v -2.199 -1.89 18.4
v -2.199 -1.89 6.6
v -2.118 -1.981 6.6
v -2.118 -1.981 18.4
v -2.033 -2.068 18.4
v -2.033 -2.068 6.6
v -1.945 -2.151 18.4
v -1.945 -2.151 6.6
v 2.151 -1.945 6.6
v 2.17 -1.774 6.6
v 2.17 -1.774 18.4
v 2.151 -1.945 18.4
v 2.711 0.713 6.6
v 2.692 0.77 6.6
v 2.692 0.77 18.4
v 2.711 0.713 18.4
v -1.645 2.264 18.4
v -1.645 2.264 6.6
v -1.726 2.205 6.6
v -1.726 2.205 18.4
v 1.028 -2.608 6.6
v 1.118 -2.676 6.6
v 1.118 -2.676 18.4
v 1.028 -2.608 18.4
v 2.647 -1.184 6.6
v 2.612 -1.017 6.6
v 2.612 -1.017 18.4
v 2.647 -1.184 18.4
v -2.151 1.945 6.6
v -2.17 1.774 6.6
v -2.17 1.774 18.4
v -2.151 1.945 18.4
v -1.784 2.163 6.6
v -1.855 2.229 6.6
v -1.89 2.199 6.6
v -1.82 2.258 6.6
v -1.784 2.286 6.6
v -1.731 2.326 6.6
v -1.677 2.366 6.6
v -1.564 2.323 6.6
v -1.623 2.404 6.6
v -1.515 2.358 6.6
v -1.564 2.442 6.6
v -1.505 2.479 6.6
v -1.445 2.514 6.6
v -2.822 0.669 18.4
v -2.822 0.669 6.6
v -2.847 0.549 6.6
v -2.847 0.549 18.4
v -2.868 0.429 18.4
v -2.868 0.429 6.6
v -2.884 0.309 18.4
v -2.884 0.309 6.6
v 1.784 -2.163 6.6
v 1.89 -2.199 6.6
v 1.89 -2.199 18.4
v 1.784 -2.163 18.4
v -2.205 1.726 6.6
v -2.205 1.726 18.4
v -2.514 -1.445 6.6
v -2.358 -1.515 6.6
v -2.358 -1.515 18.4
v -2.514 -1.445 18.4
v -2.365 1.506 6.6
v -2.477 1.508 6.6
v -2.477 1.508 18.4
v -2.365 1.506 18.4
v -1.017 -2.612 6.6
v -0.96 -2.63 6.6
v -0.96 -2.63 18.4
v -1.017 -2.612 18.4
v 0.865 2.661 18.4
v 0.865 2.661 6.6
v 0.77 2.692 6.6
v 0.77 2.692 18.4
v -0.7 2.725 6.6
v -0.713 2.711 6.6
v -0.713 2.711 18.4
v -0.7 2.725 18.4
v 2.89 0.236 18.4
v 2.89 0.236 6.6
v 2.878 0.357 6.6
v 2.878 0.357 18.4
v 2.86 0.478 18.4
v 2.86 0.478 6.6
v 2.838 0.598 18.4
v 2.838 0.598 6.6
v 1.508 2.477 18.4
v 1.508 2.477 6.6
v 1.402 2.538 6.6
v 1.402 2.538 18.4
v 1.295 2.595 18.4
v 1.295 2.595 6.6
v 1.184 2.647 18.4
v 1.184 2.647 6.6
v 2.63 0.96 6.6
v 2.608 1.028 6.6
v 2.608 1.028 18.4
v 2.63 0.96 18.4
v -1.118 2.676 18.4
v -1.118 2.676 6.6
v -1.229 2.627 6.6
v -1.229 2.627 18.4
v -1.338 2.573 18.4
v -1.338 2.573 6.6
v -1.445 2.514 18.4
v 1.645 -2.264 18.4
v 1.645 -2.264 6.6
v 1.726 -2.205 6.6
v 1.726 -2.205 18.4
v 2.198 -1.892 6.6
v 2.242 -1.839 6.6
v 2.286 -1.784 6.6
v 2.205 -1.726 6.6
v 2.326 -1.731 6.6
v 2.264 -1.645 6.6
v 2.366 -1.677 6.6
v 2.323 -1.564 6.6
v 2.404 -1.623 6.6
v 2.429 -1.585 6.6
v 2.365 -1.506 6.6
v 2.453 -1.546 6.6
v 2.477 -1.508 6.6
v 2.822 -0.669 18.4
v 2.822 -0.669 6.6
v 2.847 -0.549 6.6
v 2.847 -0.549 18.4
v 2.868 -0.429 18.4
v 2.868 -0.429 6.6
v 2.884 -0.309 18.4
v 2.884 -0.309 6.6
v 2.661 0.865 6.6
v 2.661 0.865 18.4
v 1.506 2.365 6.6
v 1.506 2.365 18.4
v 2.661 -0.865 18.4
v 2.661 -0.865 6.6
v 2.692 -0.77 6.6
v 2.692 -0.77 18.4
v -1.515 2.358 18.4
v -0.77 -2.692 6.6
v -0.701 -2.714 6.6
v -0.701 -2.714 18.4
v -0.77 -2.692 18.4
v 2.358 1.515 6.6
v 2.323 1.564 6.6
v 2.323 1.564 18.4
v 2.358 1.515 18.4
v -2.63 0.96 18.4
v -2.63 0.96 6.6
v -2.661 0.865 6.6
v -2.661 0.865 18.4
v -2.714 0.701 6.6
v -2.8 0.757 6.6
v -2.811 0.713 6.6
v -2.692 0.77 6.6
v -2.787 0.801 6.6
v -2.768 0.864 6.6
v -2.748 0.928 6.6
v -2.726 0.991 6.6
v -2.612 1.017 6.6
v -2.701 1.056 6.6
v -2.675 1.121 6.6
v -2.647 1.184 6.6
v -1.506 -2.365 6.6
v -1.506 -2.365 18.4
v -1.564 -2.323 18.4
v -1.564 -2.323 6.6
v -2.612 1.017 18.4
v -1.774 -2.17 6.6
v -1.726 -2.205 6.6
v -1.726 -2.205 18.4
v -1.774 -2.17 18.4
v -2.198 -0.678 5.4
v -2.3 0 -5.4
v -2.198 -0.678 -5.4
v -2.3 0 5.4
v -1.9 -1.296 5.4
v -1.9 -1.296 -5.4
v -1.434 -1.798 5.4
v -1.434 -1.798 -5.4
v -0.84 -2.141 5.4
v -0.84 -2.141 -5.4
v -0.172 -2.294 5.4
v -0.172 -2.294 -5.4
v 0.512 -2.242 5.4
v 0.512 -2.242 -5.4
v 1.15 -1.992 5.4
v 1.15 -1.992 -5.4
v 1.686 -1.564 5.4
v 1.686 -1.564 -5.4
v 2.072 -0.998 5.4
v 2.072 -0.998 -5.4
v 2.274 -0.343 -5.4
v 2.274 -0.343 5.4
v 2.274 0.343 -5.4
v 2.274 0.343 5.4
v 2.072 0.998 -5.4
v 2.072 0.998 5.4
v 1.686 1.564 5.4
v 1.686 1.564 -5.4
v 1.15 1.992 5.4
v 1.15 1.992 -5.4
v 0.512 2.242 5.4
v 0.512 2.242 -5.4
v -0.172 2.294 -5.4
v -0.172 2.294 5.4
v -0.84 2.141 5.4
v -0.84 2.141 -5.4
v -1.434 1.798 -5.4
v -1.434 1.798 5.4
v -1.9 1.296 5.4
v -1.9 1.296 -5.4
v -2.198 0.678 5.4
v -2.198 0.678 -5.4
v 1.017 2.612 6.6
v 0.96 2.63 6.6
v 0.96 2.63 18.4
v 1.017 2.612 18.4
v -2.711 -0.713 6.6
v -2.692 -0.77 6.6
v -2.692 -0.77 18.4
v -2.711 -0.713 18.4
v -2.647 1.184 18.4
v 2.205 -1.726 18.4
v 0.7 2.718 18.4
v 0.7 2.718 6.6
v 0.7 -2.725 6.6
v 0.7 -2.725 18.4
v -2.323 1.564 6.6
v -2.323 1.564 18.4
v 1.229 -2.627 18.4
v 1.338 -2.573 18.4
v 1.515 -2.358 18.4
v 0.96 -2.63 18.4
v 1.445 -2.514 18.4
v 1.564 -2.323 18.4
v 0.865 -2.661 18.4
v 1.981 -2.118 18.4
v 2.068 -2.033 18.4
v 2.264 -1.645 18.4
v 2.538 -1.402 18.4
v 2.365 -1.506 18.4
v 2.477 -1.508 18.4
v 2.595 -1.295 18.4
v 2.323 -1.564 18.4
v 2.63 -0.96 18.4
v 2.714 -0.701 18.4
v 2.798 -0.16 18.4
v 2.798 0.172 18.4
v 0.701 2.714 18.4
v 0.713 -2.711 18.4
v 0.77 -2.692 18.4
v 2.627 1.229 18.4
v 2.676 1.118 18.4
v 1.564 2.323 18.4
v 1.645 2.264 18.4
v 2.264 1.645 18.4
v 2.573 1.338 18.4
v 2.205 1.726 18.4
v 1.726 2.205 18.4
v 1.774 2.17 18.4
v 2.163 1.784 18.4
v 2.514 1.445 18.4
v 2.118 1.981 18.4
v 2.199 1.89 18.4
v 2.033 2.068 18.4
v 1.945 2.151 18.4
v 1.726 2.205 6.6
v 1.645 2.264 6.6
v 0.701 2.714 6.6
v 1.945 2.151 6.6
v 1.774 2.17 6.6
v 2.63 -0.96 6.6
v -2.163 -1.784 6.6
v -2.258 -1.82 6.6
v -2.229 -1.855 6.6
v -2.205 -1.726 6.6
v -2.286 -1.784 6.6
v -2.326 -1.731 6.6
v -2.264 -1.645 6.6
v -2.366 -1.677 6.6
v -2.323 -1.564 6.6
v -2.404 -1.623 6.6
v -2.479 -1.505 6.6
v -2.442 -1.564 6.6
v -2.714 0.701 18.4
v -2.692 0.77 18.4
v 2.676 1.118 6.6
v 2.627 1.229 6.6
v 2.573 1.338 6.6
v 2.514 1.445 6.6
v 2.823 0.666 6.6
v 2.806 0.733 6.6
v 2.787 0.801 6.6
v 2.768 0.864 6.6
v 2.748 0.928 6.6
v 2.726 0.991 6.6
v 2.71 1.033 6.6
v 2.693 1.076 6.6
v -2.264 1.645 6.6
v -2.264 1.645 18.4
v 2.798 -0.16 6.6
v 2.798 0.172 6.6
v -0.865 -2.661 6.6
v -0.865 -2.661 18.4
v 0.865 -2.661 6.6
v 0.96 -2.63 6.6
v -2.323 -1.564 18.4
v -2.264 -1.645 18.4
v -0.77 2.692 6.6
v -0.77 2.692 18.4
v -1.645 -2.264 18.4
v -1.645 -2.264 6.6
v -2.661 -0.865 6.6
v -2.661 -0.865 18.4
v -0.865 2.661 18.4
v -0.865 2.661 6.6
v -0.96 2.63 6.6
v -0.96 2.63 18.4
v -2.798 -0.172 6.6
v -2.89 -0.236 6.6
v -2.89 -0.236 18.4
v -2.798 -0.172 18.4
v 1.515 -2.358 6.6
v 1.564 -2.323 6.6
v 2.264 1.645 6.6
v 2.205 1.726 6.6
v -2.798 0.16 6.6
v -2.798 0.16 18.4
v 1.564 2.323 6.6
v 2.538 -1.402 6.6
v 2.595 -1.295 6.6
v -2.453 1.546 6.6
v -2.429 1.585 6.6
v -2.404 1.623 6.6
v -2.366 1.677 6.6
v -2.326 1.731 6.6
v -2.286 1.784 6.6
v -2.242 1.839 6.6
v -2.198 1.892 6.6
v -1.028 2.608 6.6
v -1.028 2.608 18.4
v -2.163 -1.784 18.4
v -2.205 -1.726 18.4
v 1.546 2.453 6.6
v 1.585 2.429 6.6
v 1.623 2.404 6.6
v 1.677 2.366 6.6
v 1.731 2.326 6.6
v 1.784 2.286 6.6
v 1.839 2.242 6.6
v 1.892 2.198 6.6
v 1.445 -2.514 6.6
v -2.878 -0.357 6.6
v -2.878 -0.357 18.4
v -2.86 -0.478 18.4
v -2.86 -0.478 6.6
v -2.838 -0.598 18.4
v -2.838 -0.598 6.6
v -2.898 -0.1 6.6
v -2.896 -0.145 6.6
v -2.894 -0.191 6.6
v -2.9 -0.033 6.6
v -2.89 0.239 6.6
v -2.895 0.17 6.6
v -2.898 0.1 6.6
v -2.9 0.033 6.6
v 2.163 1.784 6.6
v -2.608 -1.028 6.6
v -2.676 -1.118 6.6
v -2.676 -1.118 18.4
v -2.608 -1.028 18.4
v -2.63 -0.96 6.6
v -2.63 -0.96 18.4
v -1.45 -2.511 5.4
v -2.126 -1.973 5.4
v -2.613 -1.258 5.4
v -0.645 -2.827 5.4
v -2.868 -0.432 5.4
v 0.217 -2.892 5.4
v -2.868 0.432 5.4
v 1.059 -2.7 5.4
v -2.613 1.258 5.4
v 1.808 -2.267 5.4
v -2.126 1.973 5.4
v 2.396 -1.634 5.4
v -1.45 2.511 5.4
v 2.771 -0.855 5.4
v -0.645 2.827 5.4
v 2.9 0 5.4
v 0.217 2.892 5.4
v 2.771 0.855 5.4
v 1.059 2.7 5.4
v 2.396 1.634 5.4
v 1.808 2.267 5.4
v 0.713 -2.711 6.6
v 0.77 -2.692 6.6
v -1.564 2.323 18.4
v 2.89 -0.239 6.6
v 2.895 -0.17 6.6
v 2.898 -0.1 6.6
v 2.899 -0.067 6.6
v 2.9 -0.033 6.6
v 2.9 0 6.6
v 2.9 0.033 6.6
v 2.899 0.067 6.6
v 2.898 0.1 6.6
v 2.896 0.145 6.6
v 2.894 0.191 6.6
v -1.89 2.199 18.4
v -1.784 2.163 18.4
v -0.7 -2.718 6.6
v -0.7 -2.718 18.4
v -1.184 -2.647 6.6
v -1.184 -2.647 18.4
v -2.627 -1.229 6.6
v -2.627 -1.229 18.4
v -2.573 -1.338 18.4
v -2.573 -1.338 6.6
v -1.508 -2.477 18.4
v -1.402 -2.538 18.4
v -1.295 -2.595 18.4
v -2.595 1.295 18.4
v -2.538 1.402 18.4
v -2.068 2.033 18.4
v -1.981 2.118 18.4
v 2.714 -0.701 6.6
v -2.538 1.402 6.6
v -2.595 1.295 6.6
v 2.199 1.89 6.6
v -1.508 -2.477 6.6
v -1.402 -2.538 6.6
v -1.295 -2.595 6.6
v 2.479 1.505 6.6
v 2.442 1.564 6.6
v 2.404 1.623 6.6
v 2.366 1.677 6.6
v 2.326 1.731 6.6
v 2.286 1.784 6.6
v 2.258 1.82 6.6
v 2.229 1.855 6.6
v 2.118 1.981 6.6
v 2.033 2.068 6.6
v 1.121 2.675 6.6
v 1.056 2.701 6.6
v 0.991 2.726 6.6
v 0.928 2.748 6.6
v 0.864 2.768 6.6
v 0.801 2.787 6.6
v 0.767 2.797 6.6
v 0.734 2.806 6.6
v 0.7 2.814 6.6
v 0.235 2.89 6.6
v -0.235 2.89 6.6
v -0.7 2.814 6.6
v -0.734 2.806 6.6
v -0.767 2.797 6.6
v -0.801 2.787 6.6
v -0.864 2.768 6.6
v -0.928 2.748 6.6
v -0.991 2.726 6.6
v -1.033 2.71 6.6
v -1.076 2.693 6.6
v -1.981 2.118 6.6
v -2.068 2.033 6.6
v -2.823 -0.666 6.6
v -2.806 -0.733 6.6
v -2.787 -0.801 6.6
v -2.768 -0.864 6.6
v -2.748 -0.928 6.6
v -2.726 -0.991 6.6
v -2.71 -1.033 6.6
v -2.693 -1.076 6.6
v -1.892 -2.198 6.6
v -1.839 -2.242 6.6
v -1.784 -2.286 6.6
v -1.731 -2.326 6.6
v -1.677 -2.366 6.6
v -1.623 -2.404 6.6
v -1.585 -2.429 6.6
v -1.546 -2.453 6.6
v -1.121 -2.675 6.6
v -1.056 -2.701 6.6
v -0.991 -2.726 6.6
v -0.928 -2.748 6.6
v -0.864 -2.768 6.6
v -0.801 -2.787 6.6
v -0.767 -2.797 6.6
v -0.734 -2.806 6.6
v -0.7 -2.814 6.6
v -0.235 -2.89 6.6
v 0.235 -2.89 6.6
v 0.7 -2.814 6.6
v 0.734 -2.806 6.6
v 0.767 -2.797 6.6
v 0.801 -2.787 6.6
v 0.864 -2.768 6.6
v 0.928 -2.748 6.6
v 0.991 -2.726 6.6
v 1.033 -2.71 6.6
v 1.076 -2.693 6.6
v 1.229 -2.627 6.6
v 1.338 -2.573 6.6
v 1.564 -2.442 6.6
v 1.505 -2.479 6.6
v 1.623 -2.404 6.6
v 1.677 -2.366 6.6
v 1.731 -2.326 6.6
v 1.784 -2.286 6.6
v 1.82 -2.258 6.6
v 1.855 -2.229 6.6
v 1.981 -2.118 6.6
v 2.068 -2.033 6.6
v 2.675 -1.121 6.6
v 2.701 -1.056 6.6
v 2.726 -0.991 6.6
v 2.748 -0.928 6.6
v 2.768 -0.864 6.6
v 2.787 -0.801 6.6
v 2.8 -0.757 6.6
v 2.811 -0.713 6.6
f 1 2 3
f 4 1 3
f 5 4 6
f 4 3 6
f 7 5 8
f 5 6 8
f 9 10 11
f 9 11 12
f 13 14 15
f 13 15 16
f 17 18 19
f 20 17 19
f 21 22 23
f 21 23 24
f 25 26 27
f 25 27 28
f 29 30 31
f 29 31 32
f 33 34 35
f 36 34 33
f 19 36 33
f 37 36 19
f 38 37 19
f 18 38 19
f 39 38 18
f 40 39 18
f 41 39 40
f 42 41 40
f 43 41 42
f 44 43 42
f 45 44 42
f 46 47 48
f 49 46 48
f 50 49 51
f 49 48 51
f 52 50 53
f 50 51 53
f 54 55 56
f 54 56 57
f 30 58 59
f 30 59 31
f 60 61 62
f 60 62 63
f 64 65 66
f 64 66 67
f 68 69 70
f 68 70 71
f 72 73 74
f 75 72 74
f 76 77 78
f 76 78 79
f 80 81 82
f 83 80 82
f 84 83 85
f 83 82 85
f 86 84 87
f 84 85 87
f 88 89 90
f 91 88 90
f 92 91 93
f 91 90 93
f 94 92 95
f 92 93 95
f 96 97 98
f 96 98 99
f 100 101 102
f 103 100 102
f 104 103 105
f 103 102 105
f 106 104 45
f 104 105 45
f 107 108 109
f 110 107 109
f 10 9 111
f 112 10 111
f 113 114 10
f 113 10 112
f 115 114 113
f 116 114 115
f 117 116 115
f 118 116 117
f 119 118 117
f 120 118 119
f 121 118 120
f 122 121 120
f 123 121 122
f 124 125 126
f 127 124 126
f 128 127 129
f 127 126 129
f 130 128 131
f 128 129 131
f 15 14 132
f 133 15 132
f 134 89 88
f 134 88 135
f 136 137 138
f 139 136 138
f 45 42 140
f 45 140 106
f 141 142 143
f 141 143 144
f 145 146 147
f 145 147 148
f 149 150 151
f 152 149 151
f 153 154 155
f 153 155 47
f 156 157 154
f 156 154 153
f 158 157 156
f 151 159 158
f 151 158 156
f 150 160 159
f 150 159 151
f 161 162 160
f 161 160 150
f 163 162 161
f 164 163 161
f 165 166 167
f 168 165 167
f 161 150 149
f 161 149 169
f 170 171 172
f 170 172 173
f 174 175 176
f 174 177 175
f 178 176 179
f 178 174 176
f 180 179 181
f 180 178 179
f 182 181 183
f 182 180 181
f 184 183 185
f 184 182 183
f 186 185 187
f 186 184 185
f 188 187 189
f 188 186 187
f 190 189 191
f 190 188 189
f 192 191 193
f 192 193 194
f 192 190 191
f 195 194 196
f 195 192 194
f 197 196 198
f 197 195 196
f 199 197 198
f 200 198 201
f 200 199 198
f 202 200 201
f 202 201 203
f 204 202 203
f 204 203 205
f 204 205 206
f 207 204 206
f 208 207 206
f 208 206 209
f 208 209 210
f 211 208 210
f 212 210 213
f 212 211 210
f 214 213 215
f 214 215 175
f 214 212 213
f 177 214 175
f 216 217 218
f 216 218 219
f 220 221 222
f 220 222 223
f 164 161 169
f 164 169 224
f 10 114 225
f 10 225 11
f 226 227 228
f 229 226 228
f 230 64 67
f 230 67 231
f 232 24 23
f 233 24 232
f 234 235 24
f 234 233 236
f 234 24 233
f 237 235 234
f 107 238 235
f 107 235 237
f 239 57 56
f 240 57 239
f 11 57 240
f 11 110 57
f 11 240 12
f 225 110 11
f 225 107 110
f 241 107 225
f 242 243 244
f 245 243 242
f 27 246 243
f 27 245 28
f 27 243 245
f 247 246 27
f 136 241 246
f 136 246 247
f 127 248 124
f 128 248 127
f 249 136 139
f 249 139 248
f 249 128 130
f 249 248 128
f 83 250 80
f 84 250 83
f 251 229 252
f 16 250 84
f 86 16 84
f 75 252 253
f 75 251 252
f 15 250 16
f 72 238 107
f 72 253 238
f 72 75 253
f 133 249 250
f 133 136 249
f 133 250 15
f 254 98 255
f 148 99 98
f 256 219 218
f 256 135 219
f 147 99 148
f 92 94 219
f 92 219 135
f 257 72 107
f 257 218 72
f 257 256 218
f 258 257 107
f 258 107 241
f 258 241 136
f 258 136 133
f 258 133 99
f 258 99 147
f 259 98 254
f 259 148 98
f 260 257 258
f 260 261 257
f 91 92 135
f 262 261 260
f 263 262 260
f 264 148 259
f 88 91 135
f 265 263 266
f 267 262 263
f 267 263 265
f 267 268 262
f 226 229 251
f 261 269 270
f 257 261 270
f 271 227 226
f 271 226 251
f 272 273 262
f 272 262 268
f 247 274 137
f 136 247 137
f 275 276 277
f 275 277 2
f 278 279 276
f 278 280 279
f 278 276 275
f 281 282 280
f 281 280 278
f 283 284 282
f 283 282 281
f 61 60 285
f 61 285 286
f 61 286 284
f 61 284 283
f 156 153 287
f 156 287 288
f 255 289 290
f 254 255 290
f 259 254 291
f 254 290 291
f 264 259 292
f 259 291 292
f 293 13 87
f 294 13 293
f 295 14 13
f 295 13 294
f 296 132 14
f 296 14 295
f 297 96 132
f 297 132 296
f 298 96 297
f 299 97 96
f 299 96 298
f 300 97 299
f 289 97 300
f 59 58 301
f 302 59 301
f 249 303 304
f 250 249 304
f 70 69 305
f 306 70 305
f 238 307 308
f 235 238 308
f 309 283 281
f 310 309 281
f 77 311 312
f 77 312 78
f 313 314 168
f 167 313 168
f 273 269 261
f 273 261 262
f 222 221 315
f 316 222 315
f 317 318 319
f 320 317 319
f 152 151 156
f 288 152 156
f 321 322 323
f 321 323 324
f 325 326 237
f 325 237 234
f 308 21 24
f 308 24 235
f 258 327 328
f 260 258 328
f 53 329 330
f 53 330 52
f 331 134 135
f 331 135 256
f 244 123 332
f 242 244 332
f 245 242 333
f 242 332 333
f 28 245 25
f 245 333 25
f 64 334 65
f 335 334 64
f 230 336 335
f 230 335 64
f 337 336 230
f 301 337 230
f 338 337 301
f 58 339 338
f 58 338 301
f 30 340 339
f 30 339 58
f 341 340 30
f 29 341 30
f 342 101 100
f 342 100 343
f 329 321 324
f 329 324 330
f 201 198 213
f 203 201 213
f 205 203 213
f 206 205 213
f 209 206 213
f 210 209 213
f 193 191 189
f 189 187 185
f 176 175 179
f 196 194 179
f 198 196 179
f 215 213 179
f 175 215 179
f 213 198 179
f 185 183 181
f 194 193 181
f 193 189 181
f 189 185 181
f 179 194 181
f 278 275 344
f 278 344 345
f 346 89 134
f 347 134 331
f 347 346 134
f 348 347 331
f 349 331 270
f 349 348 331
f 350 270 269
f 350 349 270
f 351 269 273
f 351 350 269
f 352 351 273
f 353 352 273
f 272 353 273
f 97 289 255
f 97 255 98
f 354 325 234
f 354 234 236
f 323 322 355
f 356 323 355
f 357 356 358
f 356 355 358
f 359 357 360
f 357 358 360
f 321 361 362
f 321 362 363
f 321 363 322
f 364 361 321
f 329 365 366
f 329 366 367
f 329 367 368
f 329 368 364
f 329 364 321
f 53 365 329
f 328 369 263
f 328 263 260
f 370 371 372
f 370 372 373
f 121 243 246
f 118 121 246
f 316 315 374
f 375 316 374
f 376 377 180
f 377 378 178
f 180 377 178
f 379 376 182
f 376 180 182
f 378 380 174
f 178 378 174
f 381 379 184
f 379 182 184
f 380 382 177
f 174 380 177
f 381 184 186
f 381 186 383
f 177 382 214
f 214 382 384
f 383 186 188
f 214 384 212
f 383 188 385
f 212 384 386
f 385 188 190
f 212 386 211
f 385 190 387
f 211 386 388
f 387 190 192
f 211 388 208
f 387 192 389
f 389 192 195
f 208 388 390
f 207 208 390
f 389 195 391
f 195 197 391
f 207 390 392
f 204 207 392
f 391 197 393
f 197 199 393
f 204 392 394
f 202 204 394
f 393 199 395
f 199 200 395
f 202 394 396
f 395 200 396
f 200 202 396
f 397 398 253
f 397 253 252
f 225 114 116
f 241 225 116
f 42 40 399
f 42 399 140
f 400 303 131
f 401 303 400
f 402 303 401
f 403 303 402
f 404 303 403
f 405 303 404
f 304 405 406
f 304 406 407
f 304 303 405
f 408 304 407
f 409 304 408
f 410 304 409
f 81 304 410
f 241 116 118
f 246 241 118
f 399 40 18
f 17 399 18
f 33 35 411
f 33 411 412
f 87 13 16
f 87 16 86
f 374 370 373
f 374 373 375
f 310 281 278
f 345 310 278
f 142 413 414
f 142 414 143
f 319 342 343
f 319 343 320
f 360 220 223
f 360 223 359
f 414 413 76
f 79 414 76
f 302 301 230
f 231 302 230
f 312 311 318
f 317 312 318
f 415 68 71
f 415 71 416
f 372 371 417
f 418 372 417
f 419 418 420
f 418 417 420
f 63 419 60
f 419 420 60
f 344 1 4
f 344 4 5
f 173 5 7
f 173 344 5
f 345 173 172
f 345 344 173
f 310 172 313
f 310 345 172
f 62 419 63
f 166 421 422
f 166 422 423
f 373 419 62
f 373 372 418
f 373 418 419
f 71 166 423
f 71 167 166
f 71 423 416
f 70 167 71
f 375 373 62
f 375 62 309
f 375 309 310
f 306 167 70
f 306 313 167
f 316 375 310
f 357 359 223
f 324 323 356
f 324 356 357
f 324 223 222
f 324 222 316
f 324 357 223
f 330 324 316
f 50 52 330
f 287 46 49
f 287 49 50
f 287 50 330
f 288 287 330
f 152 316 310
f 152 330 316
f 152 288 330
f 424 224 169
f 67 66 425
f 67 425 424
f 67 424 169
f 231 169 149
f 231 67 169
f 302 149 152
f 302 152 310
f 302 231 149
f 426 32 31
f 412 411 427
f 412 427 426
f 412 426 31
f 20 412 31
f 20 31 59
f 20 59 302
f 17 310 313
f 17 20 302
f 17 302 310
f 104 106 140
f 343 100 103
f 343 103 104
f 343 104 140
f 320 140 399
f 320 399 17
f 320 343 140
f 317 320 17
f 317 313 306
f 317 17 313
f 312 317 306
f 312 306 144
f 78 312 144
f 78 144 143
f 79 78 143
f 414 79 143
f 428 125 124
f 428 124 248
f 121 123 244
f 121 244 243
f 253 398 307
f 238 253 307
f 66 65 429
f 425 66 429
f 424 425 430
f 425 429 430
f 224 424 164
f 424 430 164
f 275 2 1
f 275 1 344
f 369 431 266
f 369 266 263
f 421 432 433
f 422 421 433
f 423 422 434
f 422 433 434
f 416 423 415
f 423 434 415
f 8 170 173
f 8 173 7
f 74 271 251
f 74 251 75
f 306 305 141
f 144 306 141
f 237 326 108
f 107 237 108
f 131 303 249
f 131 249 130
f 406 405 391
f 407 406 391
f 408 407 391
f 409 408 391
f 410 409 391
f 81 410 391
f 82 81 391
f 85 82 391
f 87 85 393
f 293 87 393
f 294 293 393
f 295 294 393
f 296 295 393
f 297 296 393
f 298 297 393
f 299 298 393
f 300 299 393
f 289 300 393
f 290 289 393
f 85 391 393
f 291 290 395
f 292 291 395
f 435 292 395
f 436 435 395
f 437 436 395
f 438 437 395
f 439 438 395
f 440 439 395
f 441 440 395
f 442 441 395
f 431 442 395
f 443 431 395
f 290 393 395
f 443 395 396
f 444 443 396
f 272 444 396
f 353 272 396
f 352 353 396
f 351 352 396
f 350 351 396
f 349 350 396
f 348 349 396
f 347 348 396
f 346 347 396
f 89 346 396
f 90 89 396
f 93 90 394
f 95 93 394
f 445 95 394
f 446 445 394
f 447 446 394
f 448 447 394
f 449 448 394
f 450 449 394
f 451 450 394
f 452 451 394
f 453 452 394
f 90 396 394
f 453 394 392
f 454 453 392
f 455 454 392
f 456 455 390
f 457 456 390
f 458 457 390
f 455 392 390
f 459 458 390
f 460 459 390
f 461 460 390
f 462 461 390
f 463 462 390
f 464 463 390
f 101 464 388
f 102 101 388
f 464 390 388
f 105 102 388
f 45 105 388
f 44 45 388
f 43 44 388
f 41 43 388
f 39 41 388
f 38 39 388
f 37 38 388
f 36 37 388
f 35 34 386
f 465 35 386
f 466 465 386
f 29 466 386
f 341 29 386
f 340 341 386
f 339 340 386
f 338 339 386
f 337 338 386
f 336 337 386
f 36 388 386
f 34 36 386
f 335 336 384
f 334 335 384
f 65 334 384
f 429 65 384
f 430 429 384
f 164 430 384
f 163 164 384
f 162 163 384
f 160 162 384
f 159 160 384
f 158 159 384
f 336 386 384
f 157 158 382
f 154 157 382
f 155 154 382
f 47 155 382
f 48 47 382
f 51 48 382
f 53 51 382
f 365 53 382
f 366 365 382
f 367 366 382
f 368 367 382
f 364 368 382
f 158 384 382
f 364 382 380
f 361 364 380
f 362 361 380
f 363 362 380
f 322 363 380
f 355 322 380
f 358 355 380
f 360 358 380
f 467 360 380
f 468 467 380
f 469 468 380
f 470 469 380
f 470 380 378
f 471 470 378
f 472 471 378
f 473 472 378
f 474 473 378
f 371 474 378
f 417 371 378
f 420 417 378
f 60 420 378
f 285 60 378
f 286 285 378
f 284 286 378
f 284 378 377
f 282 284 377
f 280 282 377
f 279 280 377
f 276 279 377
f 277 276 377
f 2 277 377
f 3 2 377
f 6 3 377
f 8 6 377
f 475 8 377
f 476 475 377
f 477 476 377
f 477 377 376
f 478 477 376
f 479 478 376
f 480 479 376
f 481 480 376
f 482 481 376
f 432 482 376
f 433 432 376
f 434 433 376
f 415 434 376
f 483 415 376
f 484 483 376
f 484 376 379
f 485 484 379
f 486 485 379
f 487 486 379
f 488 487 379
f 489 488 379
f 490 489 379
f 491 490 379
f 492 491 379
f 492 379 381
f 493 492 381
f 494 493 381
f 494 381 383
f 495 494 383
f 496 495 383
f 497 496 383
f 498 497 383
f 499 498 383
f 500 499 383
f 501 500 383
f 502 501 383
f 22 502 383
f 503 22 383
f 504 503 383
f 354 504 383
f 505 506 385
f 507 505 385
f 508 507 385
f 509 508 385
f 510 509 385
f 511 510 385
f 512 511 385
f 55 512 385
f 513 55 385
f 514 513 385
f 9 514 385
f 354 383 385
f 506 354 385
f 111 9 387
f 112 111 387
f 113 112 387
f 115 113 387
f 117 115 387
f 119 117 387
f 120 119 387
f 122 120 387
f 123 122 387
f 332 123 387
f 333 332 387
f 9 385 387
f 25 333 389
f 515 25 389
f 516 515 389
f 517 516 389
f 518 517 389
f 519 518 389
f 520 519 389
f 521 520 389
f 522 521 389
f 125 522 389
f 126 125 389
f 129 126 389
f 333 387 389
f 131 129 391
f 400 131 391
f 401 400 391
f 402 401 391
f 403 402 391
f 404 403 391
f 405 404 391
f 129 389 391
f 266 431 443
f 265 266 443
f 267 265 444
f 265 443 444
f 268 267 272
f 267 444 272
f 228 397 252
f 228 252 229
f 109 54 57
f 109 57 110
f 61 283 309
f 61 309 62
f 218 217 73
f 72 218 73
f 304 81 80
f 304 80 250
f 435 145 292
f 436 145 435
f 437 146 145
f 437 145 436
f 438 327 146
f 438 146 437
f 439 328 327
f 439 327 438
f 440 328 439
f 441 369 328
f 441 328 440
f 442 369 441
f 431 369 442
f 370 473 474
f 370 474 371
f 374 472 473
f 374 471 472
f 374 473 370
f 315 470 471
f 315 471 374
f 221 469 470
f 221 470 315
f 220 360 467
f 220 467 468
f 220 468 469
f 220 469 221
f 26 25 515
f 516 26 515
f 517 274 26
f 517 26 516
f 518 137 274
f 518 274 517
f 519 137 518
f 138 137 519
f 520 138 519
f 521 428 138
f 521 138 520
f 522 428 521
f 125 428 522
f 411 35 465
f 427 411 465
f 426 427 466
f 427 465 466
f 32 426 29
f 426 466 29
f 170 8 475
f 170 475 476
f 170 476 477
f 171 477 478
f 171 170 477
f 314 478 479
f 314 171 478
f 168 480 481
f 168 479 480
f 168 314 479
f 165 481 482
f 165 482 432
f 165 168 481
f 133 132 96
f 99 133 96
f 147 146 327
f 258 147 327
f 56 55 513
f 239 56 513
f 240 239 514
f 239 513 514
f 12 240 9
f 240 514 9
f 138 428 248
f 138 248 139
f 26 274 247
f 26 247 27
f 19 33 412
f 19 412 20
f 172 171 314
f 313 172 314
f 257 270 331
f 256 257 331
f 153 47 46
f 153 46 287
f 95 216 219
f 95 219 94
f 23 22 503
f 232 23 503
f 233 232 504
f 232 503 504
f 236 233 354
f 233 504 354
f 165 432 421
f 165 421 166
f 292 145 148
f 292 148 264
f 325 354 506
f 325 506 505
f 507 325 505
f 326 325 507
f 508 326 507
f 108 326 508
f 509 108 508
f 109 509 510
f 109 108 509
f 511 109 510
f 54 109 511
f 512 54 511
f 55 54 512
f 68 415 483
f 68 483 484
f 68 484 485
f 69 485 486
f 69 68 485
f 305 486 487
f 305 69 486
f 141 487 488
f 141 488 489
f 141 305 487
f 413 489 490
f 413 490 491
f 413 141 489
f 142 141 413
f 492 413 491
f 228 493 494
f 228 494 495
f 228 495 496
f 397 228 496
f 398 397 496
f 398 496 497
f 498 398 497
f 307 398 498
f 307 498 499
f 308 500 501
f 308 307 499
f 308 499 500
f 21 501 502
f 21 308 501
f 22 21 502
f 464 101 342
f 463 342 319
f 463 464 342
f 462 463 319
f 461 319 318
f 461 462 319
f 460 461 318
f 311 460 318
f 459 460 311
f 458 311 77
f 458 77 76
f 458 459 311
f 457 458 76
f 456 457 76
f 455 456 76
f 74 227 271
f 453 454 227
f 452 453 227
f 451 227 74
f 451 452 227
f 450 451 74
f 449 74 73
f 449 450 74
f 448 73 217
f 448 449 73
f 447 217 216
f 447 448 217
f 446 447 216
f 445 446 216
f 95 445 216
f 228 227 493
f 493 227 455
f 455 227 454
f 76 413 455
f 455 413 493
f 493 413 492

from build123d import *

# Parameters (mm, degrees)
SKETCH1_R           = 2.3
BOSS_EXTRUDE1_DEPTH = 5.4
BOSS_EXTRUDE2_START = 5.4
SKETCH2_R           = 2.9
BOSS_EXTRUDE2_DEPTH = 1.2
BOSS_EXTRUDE3_START = 6.6
BOSS_EXTRUDE3_DEPTH = 11.8
CHAMFER1_START      = 6.6
CHAMFER1_DEPTH      = 11.8


with BuildPart() as part:
    # Sketch1 → Boss-Extrude1 (new, symmetric)
    with BuildSketch(Plane.XY):
        with Locations(Location((0, 0, 0), (0, 0, 180))):
            Circle(SKETCH1_R)
    extrude(amount=BOSS_EXTRUDE1_DEPTH, both=True)

    # Sketch2 → Boss-Extrude2 (add)
    with BuildSketch(Plane.XY.offset(BOSS_EXTRUDE2_START)):
        Circle(SKETCH2_R)
    extrude(amount=BOSS_EXTRUDE2_DEPTH)

    # Sketch3 → Boss-Extrude3 (add)
    with BuildSketch(Plane.XY.offset(BOSS_EXTRUDE3_START)):
        with BuildLine():
            ThreePointArc((0.800510686, 2.787325356), (0.75037611, 2.801238243), (0.7, 2.814249456))
            Line((0.7, 2.814249456), (0.7, -2.814249456))
            ThreePointArc((0.7, -2.814249456), (0.75037611, -2.801238243), (0.800510686, -2.787325356))
            Line((0.800510686, -2.787325356), (0.769608986, -2.692219705))
            Line((0.769608986, -2.692219705), (0.864714638, -2.661318005))
            Line((0.864714638, -2.661318005), (0.959820289, -2.630416306))
            Line((0.959820289, -2.630416306), (0.990721989, -2.725521957))
            ThreePointArc((0.990721989, -2.725521957), (1.316572449, -2.58391892), (1.622661808, -2.403532537))
            Line((1.622661808, -2.403532537), (1.563883283, -2.322630838))
            Line((1.563883283, -2.322630838), (1.644784982, -2.263852312))
            Line((1.644784982, -2.263852312), (1.725686682, -2.205073787))
            Line((1.725686682, -2.205073787), (1.784465207, -2.285975487))
            ThreePointArc((1.784465207, -2.285975487), (2.050609665, -2.050609665), (2.285975487, -1.784465207))
            Line((2.285975487, -1.784465207), (2.205073787, -1.725686682))
            Line((2.205073787, -1.725686682), (2.263852312, -1.644784982))
            Line((2.263852312, -1.644784982), (2.322630838, -1.563883283))
            Line((2.322630838, -1.563883283), (2.403532537, -1.622661808))
            ThreePointArc((2.403532537, -1.622661808), (2.58391892, -1.316572449), (2.725521957, -0.990721989))
            Line((2.725521957, -0.990721989), (2.630416306, -0.959820289))
            Line((2.630416306, -0.959820289), (2.661318005, -0.864714638))
            Line((2.661318005, -0.864714638), (2.692219705, -0.769608986))
            Line((2.692219705, -0.769608986), (2.787325356, -0.800510686))
            ThreePointArc((2.787325356, -0.800510686), (2.864296188, -0.453659949), (2.898275349, -0.1))
            Line((2.898275349, -0.1), (2.798275349, -0.1))
            Line((2.798275349, -0.1), (2.798275349, 0))
            Line((2.798275349, 0), (2.798275349, 0.1))
            Line((2.798275349, 0.1), (2.898275349, 0.1))
            ThreePointArc((2.898275349, 0.1), (2.864296188, 0.453659949), (2.787325356, 0.800510686))
            Line((2.787325356, 0.800510686), (2.692219705, 0.769608986))
            Line((2.692219705, 0.769608986), (2.661318005, 0.864714638))
            Line((2.661318005, 0.864714638), (2.630416306, 0.959820289))
            Line((2.630416306, 0.959820289), (2.725521957, 0.990721989))
            ThreePointArc((2.725521957, 0.990721989), (2.58391892, 1.316572449), (2.403532537, 1.622661808))
            Line((2.403532537, 1.622661808), (2.322630838, 1.563883283))
            Line((2.322630838, 1.563883283), (2.263852312, 1.644784982))
            Line((2.263852312, 1.644784982), (2.205073787, 1.725686682))
            Line((2.205073787, 1.725686682), (2.285975487, 1.784465207))
            ThreePointArc((2.285975487, 1.784465207), (2.050609665, 2.050609665), (1.784465207, 2.285975487))
            Line((1.784465207, 2.285975487), (1.725686682, 2.205073787))
            Line((1.725686682, 2.205073787), (1.644784982, 2.263852312))
            Line((1.644784982, 2.263852312), (1.563883283, 2.322630838))
            Line((1.563883283, 2.322630838), (1.622661808, 2.403532537))
            ThreePointArc((1.622661808, 2.403532537), (1.316572449, 2.58391892), (0.990721989, 2.725521957))
            Line((0.990721989, 2.725521957), (0.959820289, 2.630416306))
            Line((0.959820289, 2.630416306), (0.864714638, 2.661318005))
            Line((0.864714638, 2.661318005), (0.769608986, 2.692219705))
            Line((0.769608986, 2.692219705), (0.800510686, 2.787325356))
        make_face()
        with BuildLine():
            Line((-2.798275349, 0), (-0.7, 0))
            Line((-0.7, 0), (-0.7, 2.814249456))
            ThreePointArc((-0.7, 2.814249456), (-0.75037611, 2.801238243), (-0.800510686, 2.787325356))
            Line((-0.800510686, 2.787325356), (-0.769608986, 2.692219705))
            Line((-0.769608986, 2.692219705), (-0.864714638, 2.661318005))
            Line((-0.864714638, 2.661318005), (-0.959820289, 2.630416306))
            Line((-0.959820289, 2.630416306), (-0.990721989, 2.725521957))
            ThreePointArc((-0.990721989, 2.725521957), (-1.316572449, 2.58391892), (-1.622661808, 2.403532537))
            Line((-1.622661808, 2.403532537), (-1.563883283, 2.322630838))
            Line((-1.563883283, 2.322630838), (-1.644784982, 2.263852312))
            Line((-1.644784982, 2.263852312), (-1.725686682, 2.205073787))
            Line((-1.725686682, 2.205073787), (-1.784465207, 2.285975487))
            ThreePointArc((-1.784465207, 2.285975487), (-2.050609665, 2.050609665), (-2.285975487, 1.784465207))
            Line((-2.285975487, 1.784465207), (-2.205073787, 1.725686682))
            Line((-2.205073787, 1.725686682), (-2.263852312, 1.644784982))
            Line((-2.263852312, 1.644784982), (-2.322630838, 1.563883283))
            Line((-2.322630838, 1.563883283), (-2.403532537, 1.622661808))
            ThreePointArc((-2.403532537, 1.622661808), (-2.58391892, 1.316572449), (-2.725521957, 0.990721989))
            Line((-2.725521957, 0.990721989), (-2.630416306, 0.959820289))
            Line((-2.630416306, 0.959820289), (-2.661318005, 0.864714638))
            Line((-2.661318005, 0.864714638), (-2.692219705, 0.769608986))
            Line((-2.692219705, 0.769608986), (-2.787325356, 0.800510686))
            ThreePointArc((-2.787325356, 0.800510686), (-2.864296188, 0.453659949), (-2.898275349, 0.1))
            Line((-2.898275349, 0.1), (-2.798275349, 0.1))
            Line((-2.798275349, 0.1), (-2.798275349, 0))
        make_face()
        with BuildLine():
            Line((-0.7, -2.814249456), (-0.7, 0))
            Line((-0.7, 0), (-2.798275349, 0))
            Line((-2.798275349, 0), (-2.798275349, -0.1))
            Line((-2.798275349, -0.1), (-2.898275349, -0.1))
            ThreePointArc((-2.898275349, -0.1), (-2.864296188, -0.453659949), (-2.787325356, -0.800510686))
            Line((-2.787325356, -0.800510686), (-2.692219705, -0.769608986))
            Line((-2.692219705, -0.769608986), (-2.661318005, -0.864714638))
            Line((-2.661318005, -0.864714638), (-2.630416306, -0.959820289))
            Line((-2.630416306, -0.959820289), (-2.725521957, -0.990721989))
            ThreePointArc((-2.725521957, -0.990721989), (-2.58391892, -1.316572449), (-2.403532537, -1.622661808))
            Line((-2.403532537, -1.622661808), (-2.322630838, -1.563883283))
            Line((-2.322630838, -1.563883283), (-2.263852312, -1.644784982))
            Line((-2.263852312, -1.644784982), (-2.205073787, -1.725686682))
            Line((-2.205073787, -1.725686682), (-2.285975487, -1.784465207))
            ThreePointArc((-2.285975487, -1.784465207), (-2.050609665, -2.050609665), (-1.784465207, -2.285975487))
            Line((-1.784465207, -2.285975487), (-1.725686682, -2.205073787))
            Line((-1.725686682, -2.205073787), (-1.644784982, -2.263852312))
            Line((-1.644784982, -2.263852312), (-1.563883283, -2.322630838))
            Line((-1.563883283, -2.322630838), (-1.622661808, -2.403532537))
            ThreePointArc((-1.622661808, -2.403532537), (-1.316572449, -2.58391892), (-0.990721989, -2.725521957))
            Line((-0.990721989, -2.725521957), (-0.959820289, -2.630416306))
            Line((-0.959820289, -2.630416306), (-0.864714638, -2.661318005))
            Line((-0.864714638, -2.661318005), (-0.769608986, -2.692219705))
            Line((-0.769608986, -2.692219705), (-0.800510686, -2.787325356))
            ThreePointArc((-0.800510686, -2.787325356), (-0.75037611, -2.801238243), (-0.7, -2.814249456))
        make_face()
    extrude(amount=BOSS_EXTRUDE3_DEPTH)

    # Chamfer1: read off the stored shape, not the designer's step
    # Chamfer1 outline → Chamfer1 (cut)
    with BuildSketch(Plane.XY.offset(CHAMFER1_START)):
        with BuildLine():
            Line((2.890362517, 0.236229809), (2.798275349, 0.171923694))
            Line((2.798275349, 0.171923694), (2.798275349, 0.1))
            Line((2.798275349, 0.1), (2.898275349, 0.1))
            ThreePointArc((2.898275349, 0.1), (2.89512033, 0.168161453), (2.890362517, 0.236229809))
        make_face()
        with BuildLine():
            Line((2.898275349, -0.1), (2.798275349, -0.1))
            Line((2.798275349, -0.1), (2.798275349, -0.159867812))
            Line((2.798275349, -0.159867812), (2.883541046, -0.308530446))
            ThreePointArc((2.883541046, -0.308530446), (2.892787832, -0.204398034), (2.898275349, -0.1))
        make_face()
        with BuildLine():
            Line((2.710719876, 0.712671314), (2.837751653, 0.597633297))
            ThreePointArc((2.837751653, 0.597633297), (2.814367184, 0.69952652), (2.787325356, 0.800510686))
            Line((2.787325356, 0.800510686), (2.692219705, 0.769608986))
            Line((2.692219705, 0.769608986), (2.710719876, 0.712671314))
        make_face()
        with BuildLine():
            Line((2.630416306, 0.959820289), (2.725521957, 0.990721989))
            ThreePointArc((2.725521957, 0.990721989), (2.701458308, 1.054572429), (2.67589908, 1.117839037))
            Line((2.67589908, 1.117839037), (2.608190662, 1.028223787))
            Line((2.608190662, 1.028223787), (2.630416306, 0.959820289))
        make_face()
        with BuildLine():
            ThreePointArc((2.787325356, -0.800510686), (2.805387802, -0.734710337), (2.821897132, -0.668503238))
            Line((2.821897132, -0.668503238), (2.714445348, -0.701205489))
            Line((2.714445348, -0.701205489), (2.692219705, -0.769608986))
            Line((2.692219705, -0.769608986), (2.787325356, -0.800510686))
        make_face()
        with BuildLine():
            Line((2.357820254, 1.515449206), (2.514183356, 1.445296528))
            ThreePointArc((2.514183356, 1.445296528), (2.460456667, 1.534976543), (2.403532537, 1.622661808))
            Line((2.403532537, 1.622661808), (2.322630838, 1.563883283))
            Line((2.322630838, 1.563883283), (2.357820254, 1.515449206))
        make_face()
        with BuildLine():
            ThreePointArc((2.647069351, -1.184493078), (2.688042252, -1.088314683), (2.725521957, -0.990721989))
            Line((2.725521957, -0.990721989), (2.630416306, -0.959820289))
            Line((2.630416306, -0.959820289), (2.611916135, -1.016757962))
            Line((2.611916135, -1.016757962), (2.647069351, -1.184493078))
        make_face()
        with BuildLine():
            Line((2.205073787, 1.725686682), (2.285975487, 1.784465207))
            ThreePointArc((2.285975487, 1.784465207), (2.243358726, 1.837754507), (2.199499998, 1.890026391))
            Line((2.199499998, 1.890026391), (2.162798101, 1.783874172))
            Line((2.162798101, 1.783874172), (2.205073787, 1.725686682))
        make_face()
        with BuildLine():
            ThreePointArc((2.403532537, -1.622661808), (2.44104437, -1.56566356), (2.477204794, -1.507798531))
            Line((2.477204794, -1.507798531), (2.364906524, -1.505695792))
            Line((2.364906524, -1.505695792), (2.322630837, -1.563883283))
            Line((2.322630837, -1.563883283), (2.403532537, -1.622661808))
        make_face()
        with BuildLine():
            Line((1.774120759, 2.16988437), (1.944509275, 2.151484064))
            ThreePointArc((1.944509275, 2.151484064), (1.865699509, 2.220172368), (1.784465207, 2.285975487))
            Line((1.784465207, 2.285975487), (1.725686682, 2.205073787))
            Line((1.725686682, 2.205073787), (1.774120759, 2.16988437))
        make_face()
        with BuildLine():
            ThreePointArc((2.151484064, -1.944509275), (2.220172368, -1.865699509), (2.285975487, -1.784465207))
            Line((2.285975487, -1.784465207), (2.205073787, -1.725686682))
            Line((2.205073787, -1.725686682), (2.16988437, -1.774120759))
            Line((2.16988437, -1.774120759), (2.151484064, -1.944509275))
        make_face()
        with BuildLine():
            Line((1.563883283, 2.322630838), (1.622661808, 2.403532537))
            ThreePointArc((1.622661808, 2.403532537), (1.56566356, 2.44104437), (1.507798531, 2.477204794))
            Line((1.507798531, 2.477204794), (1.505695792, 2.364906524))
            Line((1.505695792, 2.364906524), (1.563883283, 2.322630838))
        make_face()
        with BuildLine():
            ThreePointArc((1.784465207, -2.285975487), (1.837754507, -2.243358726), (1.890026391, -2.199499998))
            Line((1.890026391, -2.199499998), (1.783874172, -2.162798101))
            Line((1.783874172, -2.162798101), (1.725686682, -2.205073787))
            Line((1.725686682, -2.205073787), (1.784465207, -2.285975487))
        make_face()
        with BuildLine():
            Line((1.016757962, 2.611916135), (1.184493078, 2.647069351))
            ThreePointArc((1.184493078, 2.647069351), (1.088314683, 2.688042252), (0.990721989, 2.725521957))
            Line((0.990721989, 2.725521957), (0.959820289, 2.630416306))
            Line((0.959820289, 2.630416306), (1.016757962, 2.611916135))
        make_face()
        with BuildLine():
            ThreePointArc((1.445296528, -2.514183356), (1.534976543, -2.460456667), (1.622661808, -2.403532537))
            Line((1.622661808, -2.403532537), (1.563883283, -2.322630838))
            Line((1.563883283, -2.322630838), (1.515449206, -2.357820254))
            Line((1.515449206, -2.357820254), (1.445296528, -2.514183356))
        make_face()
        with BuildLine():
            Line((0.769608986, 2.692219705), (0.800510686, 2.787325356))
            ThreePointArc((0.800510686, 2.787325356), (0.75037611, 2.801238243), (0.7, 2.814249456))
            Line((0.7, 2.814249456), (0.7, 2.718406296))
            Line((0.7, 2.718406296), (0.701205489, 2.714445348))
            Line((0.701205489, 2.714445348), (0.769608986, 2.692219705))
        make_face()
        with BuildLine():
            ThreePointArc((0.990721989, -2.725521957), (1.054572429, -2.701458308), (1.117839037, -2.67589908))
            Line((1.117839037, -2.67589908), (1.028223787, -2.608190662))
            Line((1.028223787, -2.608190662), (0.959820289, -2.630416306))
            Line((0.959820289, -2.630416306), (0.990721989, -2.725521957))
        make_face()
        with BuildLine():
            Line((-0.7, 2.72471229), (-0.7, 2.814249456))
            ThreePointArc((-0.7, 2.814249456), (-0.75037611, 2.801238243), (-0.800510686, 2.787325356))
            Line((-0.800510686, 2.787325356), (-0.769608986, 2.692219705))
            Line((-0.769608986, 2.692219705), (-0.712671314, 2.710719876))
            Line((-0.712671314, 2.710719876), (-0.7, 2.72471229))
        make_face()
        with BuildLine():
            ThreePointArc((0.7, -2.814249456), (0.75037611, -2.801238243), (0.800510686, -2.787325356))
            Line((0.800510686, -2.787325356), (0.769608986, -2.692219705))
            Line((0.769608986, -2.692219705), (0.712671314, -2.710719876))
            Line((0.712671314, -2.710719876), (0.7, -2.72471229))
            Line((0.7, -2.72471229), (0.7, -2.814249456))
        make_face()
        with BuildLine():
            Line((-0.959820289, 2.630416306), (-0.990721989, 2.725521957))
            ThreePointArc((-0.990721989, 2.725521957), (-1.054572429, 2.701458308), (-1.117839037, 2.67589908))
            Line((-1.117839037, 2.67589908), (-1.028223787, 2.608190662))
            Line((-1.028223787, 2.608190662), (-0.959820289, 2.630416306))
        make_face()
        with BuildLine():
            Line((-0.7, -2.814249456), (-0.7, -2.718406296))
            Line((-0.7, -2.718406296), (-0.701205489, -2.714445348))
            Line((-0.701205489, -2.714445348), (-0.769608986, -2.692219705))
            Line((-0.769608986, -2.692219705), (-0.800510686, -2.787325356))
            ThreePointArc((-0.800510686, -2.787325356), (-0.75037611, -2.801238243), (-0.7, -2.814249456))
        make_face()
        with BuildLine():
            Line((-1.515449206, 2.357820254), (-1.445296528, 2.514183356))
            ThreePointArc((-1.445296528, 2.514183356), (-1.534976543, 2.460456667), (-1.622661808, 2.403532537))
            Line((-1.622661808, 2.403532537), (-1.563883283, 2.322630838))
            Line((-1.563883283, 2.322630838), (-1.515449206, 2.357820254))
        make_face()
        with BuildLine():
            ThreePointArc((-1.184493078, -2.647069351), (-1.088314683, -2.688042252), (-0.990721989, -2.725521957))
            Line((-0.990721989, -2.725521957), (-0.959820289, -2.630416306))
            Line((-0.959820289, -2.630416306), (-1.016757962, -2.611916135))
            Line((-1.016757962, -2.611916135), (-1.184493078, -2.647069351))
        make_face()
        with BuildLine():
            Line((-1.725686682, 2.205073787), (-1.784465207, 2.285975487))
            ThreePointArc((-1.784465207, 2.285975487), (-1.837754507, 2.243358726), (-1.890026391, 2.199499998))
            Line((-1.890026391, 2.199499998), (-1.783874172, 2.162798101))
            Line((-1.783874172, 2.162798101), (-1.725686682, 2.205073787))
        make_face()
        with BuildLine():
            ThreePointArc((-1.622661808, -2.403532537), (-1.56566356, -2.44104437), (-1.507798531, -2.477204794))
            Line((-1.507798531, -2.477204794), (-1.505695792, -2.364906524))
            Line((-1.505695792, -2.364906524), (-1.563883283, -2.322630837))
            Line((-1.563883283, -2.322630837), (-1.622661808, -2.403532537))
        make_face()
        with BuildLine():
            Line((-2.16988437, 1.774120759), (-2.151484064, 1.944509275))
            ThreePointArc((-2.151484064, 1.944509275), (-2.220172368, 1.865699509), (-2.285975487, 1.784465207))
            Line((-2.285975487, 1.784465207), (-2.205073787, 1.725686682))
            Line((-2.205073787, 1.725686682), (-2.16988437, 1.774120759))
        make_face()
        with BuildLine():
            ThreePointArc((-1.944509275, -2.151484064), (-1.865699509, -2.220172368), (-1.784465207, -2.285975487))
            Line((-1.784465207, -2.285975487), (-1.725686682, -2.205073787))
            Line((-1.725686682, -2.205073787), (-1.774120759, -2.16988437))
            Line((-1.774120759, -2.16988437), (-1.944509275, -2.151484064))
        make_face()
        with BuildLine():
            Line((-2.322630838, 1.563883283), (-2.403532537, 1.622661808))
            ThreePointArc((-2.403532537, 1.622661808), (-2.44104437, 1.56566356), (-2.477204794, 1.507798531))
            Line((-2.477204794, 1.507798531), (-2.364906524, 1.505695792))
            Line((-2.364906524, 1.505695792), (-2.322630838, 1.563883283))
        make_face()
        with BuildLine():
            ThreePointArc((-2.285975487, -1.784465207), (-2.243358726, -1.837754507), (-2.199499998, -1.890026391))
            Line((-2.199499998, -1.890026391), (-2.162798101, -1.783874172))
            Line((-2.162798101, -1.783874172), (-2.205073787, -1.725686682))
            Line((-2.205073787, -1.725686682), (-2.285975487, -1.784465207))
        make_face()
        with BuildLine():
            Line((-2.611916135, 1.016757962), (-2.647069351, 1.184493078))
            ThreePointArc((-2.647069351, 1.184493078), (-2.688042252, 1.088314683), (-2.725521957, 0.990721989))
            Line((-2.725521957, 0.990721989), (-2.630416306, 0.959820289))
            Line((-2.630416306, 0.959820289), (-2.611916135, 1.016757962))
        make_face()
        with BuildLine():
            ThreePointArc((-2.514183356, -1.445296528), (-2.460456667, -1.534976543), (-2.403532537, -1.622661808))
            Line((-2.403532537, -1.622661808), (-2.322630838, -1.563883283))
            Line((-2.322630838, -1.563883283), (-2.357820254, -1.515449206))
            Line((-2.357820254, -1.515449206), (-2.514183356, -1.445296528))
        make_face()
        with BuildLine():
            Line((-2.692219705, 0.769608986), (-2.787325356, 0.800510686))
            ThreePointArc((-2.787325356, 0.800510686), (-2.805387802, 0.734710337), (-2.821897132, 0.668503238))
            Line((-2.821897132, 0.668503238), (-2.714445348, 0.701205489))
            Line((-2.714445348, 0.701205489), (-2.692219705, 0.769608986))
        make_face()
        with BuildLine():
            ThreePointArc((-2.725521957, -0.990721989), (-2.701458308, -1.054572429), (-2.67589908, -1.117839037))
            Line((-2.67589908, -1.117839037), (-2.608190662, -1.028223787))
            Line((-2.608190662, -1.028223787), (-2.630416306, -0.959820289))
            Line((-2.630416306, -0.959820289), (-2.725521957, -0.990721989))
        make_face()
        with BuildLine():
            Line((-2.798275349, 0.159867812), (-2.883541046, 0.308530446))
            ThreePointArc((-2.883541046, 0.308530446), (-2.892787832, 0.204398034), (-2.898275349, 0.1))
            Line((-2.898275349, 0.1), (-2.798275349, 0.1))
            Line((-2.798275349, 0.1), (-2.798275349, 0.159867812))
        make_face()
        with BuildLine():
            ThreePointArc((-2.837751653, -0.597633297), (-2.814367184, -0.69952652), (-2.787325356, -0.800510686))
            Line((-2.787325356, -0.800510686), (-2.692219705, -0.769608986))
            Line((-2.692219705, -0.769608986), (-2.710719876, -0.712671314))
            Line((-2.710719876, -0.712671314), (-2.837751653, -0.597633297))
        make_face()
        with BuildLine():
            Line((-2.798275349, -0.1), (-2.898275349, -0.1))
            ThreePointArc((-2.898275349, -0.1), (-2.89512033, -0.168161453), (-2.890362517, -0.236229809))
            Line((-2.890362517, -0.236229809), (-2.798275349, -0.171923694))
            Line((-2.798275349, -0.171923694), (-2.798275349, -0.1))
        make_face()
    extrude(amount=CHAMFER1_DEPTH, mode=Mode.SUBTRACT)


solid = part.part
